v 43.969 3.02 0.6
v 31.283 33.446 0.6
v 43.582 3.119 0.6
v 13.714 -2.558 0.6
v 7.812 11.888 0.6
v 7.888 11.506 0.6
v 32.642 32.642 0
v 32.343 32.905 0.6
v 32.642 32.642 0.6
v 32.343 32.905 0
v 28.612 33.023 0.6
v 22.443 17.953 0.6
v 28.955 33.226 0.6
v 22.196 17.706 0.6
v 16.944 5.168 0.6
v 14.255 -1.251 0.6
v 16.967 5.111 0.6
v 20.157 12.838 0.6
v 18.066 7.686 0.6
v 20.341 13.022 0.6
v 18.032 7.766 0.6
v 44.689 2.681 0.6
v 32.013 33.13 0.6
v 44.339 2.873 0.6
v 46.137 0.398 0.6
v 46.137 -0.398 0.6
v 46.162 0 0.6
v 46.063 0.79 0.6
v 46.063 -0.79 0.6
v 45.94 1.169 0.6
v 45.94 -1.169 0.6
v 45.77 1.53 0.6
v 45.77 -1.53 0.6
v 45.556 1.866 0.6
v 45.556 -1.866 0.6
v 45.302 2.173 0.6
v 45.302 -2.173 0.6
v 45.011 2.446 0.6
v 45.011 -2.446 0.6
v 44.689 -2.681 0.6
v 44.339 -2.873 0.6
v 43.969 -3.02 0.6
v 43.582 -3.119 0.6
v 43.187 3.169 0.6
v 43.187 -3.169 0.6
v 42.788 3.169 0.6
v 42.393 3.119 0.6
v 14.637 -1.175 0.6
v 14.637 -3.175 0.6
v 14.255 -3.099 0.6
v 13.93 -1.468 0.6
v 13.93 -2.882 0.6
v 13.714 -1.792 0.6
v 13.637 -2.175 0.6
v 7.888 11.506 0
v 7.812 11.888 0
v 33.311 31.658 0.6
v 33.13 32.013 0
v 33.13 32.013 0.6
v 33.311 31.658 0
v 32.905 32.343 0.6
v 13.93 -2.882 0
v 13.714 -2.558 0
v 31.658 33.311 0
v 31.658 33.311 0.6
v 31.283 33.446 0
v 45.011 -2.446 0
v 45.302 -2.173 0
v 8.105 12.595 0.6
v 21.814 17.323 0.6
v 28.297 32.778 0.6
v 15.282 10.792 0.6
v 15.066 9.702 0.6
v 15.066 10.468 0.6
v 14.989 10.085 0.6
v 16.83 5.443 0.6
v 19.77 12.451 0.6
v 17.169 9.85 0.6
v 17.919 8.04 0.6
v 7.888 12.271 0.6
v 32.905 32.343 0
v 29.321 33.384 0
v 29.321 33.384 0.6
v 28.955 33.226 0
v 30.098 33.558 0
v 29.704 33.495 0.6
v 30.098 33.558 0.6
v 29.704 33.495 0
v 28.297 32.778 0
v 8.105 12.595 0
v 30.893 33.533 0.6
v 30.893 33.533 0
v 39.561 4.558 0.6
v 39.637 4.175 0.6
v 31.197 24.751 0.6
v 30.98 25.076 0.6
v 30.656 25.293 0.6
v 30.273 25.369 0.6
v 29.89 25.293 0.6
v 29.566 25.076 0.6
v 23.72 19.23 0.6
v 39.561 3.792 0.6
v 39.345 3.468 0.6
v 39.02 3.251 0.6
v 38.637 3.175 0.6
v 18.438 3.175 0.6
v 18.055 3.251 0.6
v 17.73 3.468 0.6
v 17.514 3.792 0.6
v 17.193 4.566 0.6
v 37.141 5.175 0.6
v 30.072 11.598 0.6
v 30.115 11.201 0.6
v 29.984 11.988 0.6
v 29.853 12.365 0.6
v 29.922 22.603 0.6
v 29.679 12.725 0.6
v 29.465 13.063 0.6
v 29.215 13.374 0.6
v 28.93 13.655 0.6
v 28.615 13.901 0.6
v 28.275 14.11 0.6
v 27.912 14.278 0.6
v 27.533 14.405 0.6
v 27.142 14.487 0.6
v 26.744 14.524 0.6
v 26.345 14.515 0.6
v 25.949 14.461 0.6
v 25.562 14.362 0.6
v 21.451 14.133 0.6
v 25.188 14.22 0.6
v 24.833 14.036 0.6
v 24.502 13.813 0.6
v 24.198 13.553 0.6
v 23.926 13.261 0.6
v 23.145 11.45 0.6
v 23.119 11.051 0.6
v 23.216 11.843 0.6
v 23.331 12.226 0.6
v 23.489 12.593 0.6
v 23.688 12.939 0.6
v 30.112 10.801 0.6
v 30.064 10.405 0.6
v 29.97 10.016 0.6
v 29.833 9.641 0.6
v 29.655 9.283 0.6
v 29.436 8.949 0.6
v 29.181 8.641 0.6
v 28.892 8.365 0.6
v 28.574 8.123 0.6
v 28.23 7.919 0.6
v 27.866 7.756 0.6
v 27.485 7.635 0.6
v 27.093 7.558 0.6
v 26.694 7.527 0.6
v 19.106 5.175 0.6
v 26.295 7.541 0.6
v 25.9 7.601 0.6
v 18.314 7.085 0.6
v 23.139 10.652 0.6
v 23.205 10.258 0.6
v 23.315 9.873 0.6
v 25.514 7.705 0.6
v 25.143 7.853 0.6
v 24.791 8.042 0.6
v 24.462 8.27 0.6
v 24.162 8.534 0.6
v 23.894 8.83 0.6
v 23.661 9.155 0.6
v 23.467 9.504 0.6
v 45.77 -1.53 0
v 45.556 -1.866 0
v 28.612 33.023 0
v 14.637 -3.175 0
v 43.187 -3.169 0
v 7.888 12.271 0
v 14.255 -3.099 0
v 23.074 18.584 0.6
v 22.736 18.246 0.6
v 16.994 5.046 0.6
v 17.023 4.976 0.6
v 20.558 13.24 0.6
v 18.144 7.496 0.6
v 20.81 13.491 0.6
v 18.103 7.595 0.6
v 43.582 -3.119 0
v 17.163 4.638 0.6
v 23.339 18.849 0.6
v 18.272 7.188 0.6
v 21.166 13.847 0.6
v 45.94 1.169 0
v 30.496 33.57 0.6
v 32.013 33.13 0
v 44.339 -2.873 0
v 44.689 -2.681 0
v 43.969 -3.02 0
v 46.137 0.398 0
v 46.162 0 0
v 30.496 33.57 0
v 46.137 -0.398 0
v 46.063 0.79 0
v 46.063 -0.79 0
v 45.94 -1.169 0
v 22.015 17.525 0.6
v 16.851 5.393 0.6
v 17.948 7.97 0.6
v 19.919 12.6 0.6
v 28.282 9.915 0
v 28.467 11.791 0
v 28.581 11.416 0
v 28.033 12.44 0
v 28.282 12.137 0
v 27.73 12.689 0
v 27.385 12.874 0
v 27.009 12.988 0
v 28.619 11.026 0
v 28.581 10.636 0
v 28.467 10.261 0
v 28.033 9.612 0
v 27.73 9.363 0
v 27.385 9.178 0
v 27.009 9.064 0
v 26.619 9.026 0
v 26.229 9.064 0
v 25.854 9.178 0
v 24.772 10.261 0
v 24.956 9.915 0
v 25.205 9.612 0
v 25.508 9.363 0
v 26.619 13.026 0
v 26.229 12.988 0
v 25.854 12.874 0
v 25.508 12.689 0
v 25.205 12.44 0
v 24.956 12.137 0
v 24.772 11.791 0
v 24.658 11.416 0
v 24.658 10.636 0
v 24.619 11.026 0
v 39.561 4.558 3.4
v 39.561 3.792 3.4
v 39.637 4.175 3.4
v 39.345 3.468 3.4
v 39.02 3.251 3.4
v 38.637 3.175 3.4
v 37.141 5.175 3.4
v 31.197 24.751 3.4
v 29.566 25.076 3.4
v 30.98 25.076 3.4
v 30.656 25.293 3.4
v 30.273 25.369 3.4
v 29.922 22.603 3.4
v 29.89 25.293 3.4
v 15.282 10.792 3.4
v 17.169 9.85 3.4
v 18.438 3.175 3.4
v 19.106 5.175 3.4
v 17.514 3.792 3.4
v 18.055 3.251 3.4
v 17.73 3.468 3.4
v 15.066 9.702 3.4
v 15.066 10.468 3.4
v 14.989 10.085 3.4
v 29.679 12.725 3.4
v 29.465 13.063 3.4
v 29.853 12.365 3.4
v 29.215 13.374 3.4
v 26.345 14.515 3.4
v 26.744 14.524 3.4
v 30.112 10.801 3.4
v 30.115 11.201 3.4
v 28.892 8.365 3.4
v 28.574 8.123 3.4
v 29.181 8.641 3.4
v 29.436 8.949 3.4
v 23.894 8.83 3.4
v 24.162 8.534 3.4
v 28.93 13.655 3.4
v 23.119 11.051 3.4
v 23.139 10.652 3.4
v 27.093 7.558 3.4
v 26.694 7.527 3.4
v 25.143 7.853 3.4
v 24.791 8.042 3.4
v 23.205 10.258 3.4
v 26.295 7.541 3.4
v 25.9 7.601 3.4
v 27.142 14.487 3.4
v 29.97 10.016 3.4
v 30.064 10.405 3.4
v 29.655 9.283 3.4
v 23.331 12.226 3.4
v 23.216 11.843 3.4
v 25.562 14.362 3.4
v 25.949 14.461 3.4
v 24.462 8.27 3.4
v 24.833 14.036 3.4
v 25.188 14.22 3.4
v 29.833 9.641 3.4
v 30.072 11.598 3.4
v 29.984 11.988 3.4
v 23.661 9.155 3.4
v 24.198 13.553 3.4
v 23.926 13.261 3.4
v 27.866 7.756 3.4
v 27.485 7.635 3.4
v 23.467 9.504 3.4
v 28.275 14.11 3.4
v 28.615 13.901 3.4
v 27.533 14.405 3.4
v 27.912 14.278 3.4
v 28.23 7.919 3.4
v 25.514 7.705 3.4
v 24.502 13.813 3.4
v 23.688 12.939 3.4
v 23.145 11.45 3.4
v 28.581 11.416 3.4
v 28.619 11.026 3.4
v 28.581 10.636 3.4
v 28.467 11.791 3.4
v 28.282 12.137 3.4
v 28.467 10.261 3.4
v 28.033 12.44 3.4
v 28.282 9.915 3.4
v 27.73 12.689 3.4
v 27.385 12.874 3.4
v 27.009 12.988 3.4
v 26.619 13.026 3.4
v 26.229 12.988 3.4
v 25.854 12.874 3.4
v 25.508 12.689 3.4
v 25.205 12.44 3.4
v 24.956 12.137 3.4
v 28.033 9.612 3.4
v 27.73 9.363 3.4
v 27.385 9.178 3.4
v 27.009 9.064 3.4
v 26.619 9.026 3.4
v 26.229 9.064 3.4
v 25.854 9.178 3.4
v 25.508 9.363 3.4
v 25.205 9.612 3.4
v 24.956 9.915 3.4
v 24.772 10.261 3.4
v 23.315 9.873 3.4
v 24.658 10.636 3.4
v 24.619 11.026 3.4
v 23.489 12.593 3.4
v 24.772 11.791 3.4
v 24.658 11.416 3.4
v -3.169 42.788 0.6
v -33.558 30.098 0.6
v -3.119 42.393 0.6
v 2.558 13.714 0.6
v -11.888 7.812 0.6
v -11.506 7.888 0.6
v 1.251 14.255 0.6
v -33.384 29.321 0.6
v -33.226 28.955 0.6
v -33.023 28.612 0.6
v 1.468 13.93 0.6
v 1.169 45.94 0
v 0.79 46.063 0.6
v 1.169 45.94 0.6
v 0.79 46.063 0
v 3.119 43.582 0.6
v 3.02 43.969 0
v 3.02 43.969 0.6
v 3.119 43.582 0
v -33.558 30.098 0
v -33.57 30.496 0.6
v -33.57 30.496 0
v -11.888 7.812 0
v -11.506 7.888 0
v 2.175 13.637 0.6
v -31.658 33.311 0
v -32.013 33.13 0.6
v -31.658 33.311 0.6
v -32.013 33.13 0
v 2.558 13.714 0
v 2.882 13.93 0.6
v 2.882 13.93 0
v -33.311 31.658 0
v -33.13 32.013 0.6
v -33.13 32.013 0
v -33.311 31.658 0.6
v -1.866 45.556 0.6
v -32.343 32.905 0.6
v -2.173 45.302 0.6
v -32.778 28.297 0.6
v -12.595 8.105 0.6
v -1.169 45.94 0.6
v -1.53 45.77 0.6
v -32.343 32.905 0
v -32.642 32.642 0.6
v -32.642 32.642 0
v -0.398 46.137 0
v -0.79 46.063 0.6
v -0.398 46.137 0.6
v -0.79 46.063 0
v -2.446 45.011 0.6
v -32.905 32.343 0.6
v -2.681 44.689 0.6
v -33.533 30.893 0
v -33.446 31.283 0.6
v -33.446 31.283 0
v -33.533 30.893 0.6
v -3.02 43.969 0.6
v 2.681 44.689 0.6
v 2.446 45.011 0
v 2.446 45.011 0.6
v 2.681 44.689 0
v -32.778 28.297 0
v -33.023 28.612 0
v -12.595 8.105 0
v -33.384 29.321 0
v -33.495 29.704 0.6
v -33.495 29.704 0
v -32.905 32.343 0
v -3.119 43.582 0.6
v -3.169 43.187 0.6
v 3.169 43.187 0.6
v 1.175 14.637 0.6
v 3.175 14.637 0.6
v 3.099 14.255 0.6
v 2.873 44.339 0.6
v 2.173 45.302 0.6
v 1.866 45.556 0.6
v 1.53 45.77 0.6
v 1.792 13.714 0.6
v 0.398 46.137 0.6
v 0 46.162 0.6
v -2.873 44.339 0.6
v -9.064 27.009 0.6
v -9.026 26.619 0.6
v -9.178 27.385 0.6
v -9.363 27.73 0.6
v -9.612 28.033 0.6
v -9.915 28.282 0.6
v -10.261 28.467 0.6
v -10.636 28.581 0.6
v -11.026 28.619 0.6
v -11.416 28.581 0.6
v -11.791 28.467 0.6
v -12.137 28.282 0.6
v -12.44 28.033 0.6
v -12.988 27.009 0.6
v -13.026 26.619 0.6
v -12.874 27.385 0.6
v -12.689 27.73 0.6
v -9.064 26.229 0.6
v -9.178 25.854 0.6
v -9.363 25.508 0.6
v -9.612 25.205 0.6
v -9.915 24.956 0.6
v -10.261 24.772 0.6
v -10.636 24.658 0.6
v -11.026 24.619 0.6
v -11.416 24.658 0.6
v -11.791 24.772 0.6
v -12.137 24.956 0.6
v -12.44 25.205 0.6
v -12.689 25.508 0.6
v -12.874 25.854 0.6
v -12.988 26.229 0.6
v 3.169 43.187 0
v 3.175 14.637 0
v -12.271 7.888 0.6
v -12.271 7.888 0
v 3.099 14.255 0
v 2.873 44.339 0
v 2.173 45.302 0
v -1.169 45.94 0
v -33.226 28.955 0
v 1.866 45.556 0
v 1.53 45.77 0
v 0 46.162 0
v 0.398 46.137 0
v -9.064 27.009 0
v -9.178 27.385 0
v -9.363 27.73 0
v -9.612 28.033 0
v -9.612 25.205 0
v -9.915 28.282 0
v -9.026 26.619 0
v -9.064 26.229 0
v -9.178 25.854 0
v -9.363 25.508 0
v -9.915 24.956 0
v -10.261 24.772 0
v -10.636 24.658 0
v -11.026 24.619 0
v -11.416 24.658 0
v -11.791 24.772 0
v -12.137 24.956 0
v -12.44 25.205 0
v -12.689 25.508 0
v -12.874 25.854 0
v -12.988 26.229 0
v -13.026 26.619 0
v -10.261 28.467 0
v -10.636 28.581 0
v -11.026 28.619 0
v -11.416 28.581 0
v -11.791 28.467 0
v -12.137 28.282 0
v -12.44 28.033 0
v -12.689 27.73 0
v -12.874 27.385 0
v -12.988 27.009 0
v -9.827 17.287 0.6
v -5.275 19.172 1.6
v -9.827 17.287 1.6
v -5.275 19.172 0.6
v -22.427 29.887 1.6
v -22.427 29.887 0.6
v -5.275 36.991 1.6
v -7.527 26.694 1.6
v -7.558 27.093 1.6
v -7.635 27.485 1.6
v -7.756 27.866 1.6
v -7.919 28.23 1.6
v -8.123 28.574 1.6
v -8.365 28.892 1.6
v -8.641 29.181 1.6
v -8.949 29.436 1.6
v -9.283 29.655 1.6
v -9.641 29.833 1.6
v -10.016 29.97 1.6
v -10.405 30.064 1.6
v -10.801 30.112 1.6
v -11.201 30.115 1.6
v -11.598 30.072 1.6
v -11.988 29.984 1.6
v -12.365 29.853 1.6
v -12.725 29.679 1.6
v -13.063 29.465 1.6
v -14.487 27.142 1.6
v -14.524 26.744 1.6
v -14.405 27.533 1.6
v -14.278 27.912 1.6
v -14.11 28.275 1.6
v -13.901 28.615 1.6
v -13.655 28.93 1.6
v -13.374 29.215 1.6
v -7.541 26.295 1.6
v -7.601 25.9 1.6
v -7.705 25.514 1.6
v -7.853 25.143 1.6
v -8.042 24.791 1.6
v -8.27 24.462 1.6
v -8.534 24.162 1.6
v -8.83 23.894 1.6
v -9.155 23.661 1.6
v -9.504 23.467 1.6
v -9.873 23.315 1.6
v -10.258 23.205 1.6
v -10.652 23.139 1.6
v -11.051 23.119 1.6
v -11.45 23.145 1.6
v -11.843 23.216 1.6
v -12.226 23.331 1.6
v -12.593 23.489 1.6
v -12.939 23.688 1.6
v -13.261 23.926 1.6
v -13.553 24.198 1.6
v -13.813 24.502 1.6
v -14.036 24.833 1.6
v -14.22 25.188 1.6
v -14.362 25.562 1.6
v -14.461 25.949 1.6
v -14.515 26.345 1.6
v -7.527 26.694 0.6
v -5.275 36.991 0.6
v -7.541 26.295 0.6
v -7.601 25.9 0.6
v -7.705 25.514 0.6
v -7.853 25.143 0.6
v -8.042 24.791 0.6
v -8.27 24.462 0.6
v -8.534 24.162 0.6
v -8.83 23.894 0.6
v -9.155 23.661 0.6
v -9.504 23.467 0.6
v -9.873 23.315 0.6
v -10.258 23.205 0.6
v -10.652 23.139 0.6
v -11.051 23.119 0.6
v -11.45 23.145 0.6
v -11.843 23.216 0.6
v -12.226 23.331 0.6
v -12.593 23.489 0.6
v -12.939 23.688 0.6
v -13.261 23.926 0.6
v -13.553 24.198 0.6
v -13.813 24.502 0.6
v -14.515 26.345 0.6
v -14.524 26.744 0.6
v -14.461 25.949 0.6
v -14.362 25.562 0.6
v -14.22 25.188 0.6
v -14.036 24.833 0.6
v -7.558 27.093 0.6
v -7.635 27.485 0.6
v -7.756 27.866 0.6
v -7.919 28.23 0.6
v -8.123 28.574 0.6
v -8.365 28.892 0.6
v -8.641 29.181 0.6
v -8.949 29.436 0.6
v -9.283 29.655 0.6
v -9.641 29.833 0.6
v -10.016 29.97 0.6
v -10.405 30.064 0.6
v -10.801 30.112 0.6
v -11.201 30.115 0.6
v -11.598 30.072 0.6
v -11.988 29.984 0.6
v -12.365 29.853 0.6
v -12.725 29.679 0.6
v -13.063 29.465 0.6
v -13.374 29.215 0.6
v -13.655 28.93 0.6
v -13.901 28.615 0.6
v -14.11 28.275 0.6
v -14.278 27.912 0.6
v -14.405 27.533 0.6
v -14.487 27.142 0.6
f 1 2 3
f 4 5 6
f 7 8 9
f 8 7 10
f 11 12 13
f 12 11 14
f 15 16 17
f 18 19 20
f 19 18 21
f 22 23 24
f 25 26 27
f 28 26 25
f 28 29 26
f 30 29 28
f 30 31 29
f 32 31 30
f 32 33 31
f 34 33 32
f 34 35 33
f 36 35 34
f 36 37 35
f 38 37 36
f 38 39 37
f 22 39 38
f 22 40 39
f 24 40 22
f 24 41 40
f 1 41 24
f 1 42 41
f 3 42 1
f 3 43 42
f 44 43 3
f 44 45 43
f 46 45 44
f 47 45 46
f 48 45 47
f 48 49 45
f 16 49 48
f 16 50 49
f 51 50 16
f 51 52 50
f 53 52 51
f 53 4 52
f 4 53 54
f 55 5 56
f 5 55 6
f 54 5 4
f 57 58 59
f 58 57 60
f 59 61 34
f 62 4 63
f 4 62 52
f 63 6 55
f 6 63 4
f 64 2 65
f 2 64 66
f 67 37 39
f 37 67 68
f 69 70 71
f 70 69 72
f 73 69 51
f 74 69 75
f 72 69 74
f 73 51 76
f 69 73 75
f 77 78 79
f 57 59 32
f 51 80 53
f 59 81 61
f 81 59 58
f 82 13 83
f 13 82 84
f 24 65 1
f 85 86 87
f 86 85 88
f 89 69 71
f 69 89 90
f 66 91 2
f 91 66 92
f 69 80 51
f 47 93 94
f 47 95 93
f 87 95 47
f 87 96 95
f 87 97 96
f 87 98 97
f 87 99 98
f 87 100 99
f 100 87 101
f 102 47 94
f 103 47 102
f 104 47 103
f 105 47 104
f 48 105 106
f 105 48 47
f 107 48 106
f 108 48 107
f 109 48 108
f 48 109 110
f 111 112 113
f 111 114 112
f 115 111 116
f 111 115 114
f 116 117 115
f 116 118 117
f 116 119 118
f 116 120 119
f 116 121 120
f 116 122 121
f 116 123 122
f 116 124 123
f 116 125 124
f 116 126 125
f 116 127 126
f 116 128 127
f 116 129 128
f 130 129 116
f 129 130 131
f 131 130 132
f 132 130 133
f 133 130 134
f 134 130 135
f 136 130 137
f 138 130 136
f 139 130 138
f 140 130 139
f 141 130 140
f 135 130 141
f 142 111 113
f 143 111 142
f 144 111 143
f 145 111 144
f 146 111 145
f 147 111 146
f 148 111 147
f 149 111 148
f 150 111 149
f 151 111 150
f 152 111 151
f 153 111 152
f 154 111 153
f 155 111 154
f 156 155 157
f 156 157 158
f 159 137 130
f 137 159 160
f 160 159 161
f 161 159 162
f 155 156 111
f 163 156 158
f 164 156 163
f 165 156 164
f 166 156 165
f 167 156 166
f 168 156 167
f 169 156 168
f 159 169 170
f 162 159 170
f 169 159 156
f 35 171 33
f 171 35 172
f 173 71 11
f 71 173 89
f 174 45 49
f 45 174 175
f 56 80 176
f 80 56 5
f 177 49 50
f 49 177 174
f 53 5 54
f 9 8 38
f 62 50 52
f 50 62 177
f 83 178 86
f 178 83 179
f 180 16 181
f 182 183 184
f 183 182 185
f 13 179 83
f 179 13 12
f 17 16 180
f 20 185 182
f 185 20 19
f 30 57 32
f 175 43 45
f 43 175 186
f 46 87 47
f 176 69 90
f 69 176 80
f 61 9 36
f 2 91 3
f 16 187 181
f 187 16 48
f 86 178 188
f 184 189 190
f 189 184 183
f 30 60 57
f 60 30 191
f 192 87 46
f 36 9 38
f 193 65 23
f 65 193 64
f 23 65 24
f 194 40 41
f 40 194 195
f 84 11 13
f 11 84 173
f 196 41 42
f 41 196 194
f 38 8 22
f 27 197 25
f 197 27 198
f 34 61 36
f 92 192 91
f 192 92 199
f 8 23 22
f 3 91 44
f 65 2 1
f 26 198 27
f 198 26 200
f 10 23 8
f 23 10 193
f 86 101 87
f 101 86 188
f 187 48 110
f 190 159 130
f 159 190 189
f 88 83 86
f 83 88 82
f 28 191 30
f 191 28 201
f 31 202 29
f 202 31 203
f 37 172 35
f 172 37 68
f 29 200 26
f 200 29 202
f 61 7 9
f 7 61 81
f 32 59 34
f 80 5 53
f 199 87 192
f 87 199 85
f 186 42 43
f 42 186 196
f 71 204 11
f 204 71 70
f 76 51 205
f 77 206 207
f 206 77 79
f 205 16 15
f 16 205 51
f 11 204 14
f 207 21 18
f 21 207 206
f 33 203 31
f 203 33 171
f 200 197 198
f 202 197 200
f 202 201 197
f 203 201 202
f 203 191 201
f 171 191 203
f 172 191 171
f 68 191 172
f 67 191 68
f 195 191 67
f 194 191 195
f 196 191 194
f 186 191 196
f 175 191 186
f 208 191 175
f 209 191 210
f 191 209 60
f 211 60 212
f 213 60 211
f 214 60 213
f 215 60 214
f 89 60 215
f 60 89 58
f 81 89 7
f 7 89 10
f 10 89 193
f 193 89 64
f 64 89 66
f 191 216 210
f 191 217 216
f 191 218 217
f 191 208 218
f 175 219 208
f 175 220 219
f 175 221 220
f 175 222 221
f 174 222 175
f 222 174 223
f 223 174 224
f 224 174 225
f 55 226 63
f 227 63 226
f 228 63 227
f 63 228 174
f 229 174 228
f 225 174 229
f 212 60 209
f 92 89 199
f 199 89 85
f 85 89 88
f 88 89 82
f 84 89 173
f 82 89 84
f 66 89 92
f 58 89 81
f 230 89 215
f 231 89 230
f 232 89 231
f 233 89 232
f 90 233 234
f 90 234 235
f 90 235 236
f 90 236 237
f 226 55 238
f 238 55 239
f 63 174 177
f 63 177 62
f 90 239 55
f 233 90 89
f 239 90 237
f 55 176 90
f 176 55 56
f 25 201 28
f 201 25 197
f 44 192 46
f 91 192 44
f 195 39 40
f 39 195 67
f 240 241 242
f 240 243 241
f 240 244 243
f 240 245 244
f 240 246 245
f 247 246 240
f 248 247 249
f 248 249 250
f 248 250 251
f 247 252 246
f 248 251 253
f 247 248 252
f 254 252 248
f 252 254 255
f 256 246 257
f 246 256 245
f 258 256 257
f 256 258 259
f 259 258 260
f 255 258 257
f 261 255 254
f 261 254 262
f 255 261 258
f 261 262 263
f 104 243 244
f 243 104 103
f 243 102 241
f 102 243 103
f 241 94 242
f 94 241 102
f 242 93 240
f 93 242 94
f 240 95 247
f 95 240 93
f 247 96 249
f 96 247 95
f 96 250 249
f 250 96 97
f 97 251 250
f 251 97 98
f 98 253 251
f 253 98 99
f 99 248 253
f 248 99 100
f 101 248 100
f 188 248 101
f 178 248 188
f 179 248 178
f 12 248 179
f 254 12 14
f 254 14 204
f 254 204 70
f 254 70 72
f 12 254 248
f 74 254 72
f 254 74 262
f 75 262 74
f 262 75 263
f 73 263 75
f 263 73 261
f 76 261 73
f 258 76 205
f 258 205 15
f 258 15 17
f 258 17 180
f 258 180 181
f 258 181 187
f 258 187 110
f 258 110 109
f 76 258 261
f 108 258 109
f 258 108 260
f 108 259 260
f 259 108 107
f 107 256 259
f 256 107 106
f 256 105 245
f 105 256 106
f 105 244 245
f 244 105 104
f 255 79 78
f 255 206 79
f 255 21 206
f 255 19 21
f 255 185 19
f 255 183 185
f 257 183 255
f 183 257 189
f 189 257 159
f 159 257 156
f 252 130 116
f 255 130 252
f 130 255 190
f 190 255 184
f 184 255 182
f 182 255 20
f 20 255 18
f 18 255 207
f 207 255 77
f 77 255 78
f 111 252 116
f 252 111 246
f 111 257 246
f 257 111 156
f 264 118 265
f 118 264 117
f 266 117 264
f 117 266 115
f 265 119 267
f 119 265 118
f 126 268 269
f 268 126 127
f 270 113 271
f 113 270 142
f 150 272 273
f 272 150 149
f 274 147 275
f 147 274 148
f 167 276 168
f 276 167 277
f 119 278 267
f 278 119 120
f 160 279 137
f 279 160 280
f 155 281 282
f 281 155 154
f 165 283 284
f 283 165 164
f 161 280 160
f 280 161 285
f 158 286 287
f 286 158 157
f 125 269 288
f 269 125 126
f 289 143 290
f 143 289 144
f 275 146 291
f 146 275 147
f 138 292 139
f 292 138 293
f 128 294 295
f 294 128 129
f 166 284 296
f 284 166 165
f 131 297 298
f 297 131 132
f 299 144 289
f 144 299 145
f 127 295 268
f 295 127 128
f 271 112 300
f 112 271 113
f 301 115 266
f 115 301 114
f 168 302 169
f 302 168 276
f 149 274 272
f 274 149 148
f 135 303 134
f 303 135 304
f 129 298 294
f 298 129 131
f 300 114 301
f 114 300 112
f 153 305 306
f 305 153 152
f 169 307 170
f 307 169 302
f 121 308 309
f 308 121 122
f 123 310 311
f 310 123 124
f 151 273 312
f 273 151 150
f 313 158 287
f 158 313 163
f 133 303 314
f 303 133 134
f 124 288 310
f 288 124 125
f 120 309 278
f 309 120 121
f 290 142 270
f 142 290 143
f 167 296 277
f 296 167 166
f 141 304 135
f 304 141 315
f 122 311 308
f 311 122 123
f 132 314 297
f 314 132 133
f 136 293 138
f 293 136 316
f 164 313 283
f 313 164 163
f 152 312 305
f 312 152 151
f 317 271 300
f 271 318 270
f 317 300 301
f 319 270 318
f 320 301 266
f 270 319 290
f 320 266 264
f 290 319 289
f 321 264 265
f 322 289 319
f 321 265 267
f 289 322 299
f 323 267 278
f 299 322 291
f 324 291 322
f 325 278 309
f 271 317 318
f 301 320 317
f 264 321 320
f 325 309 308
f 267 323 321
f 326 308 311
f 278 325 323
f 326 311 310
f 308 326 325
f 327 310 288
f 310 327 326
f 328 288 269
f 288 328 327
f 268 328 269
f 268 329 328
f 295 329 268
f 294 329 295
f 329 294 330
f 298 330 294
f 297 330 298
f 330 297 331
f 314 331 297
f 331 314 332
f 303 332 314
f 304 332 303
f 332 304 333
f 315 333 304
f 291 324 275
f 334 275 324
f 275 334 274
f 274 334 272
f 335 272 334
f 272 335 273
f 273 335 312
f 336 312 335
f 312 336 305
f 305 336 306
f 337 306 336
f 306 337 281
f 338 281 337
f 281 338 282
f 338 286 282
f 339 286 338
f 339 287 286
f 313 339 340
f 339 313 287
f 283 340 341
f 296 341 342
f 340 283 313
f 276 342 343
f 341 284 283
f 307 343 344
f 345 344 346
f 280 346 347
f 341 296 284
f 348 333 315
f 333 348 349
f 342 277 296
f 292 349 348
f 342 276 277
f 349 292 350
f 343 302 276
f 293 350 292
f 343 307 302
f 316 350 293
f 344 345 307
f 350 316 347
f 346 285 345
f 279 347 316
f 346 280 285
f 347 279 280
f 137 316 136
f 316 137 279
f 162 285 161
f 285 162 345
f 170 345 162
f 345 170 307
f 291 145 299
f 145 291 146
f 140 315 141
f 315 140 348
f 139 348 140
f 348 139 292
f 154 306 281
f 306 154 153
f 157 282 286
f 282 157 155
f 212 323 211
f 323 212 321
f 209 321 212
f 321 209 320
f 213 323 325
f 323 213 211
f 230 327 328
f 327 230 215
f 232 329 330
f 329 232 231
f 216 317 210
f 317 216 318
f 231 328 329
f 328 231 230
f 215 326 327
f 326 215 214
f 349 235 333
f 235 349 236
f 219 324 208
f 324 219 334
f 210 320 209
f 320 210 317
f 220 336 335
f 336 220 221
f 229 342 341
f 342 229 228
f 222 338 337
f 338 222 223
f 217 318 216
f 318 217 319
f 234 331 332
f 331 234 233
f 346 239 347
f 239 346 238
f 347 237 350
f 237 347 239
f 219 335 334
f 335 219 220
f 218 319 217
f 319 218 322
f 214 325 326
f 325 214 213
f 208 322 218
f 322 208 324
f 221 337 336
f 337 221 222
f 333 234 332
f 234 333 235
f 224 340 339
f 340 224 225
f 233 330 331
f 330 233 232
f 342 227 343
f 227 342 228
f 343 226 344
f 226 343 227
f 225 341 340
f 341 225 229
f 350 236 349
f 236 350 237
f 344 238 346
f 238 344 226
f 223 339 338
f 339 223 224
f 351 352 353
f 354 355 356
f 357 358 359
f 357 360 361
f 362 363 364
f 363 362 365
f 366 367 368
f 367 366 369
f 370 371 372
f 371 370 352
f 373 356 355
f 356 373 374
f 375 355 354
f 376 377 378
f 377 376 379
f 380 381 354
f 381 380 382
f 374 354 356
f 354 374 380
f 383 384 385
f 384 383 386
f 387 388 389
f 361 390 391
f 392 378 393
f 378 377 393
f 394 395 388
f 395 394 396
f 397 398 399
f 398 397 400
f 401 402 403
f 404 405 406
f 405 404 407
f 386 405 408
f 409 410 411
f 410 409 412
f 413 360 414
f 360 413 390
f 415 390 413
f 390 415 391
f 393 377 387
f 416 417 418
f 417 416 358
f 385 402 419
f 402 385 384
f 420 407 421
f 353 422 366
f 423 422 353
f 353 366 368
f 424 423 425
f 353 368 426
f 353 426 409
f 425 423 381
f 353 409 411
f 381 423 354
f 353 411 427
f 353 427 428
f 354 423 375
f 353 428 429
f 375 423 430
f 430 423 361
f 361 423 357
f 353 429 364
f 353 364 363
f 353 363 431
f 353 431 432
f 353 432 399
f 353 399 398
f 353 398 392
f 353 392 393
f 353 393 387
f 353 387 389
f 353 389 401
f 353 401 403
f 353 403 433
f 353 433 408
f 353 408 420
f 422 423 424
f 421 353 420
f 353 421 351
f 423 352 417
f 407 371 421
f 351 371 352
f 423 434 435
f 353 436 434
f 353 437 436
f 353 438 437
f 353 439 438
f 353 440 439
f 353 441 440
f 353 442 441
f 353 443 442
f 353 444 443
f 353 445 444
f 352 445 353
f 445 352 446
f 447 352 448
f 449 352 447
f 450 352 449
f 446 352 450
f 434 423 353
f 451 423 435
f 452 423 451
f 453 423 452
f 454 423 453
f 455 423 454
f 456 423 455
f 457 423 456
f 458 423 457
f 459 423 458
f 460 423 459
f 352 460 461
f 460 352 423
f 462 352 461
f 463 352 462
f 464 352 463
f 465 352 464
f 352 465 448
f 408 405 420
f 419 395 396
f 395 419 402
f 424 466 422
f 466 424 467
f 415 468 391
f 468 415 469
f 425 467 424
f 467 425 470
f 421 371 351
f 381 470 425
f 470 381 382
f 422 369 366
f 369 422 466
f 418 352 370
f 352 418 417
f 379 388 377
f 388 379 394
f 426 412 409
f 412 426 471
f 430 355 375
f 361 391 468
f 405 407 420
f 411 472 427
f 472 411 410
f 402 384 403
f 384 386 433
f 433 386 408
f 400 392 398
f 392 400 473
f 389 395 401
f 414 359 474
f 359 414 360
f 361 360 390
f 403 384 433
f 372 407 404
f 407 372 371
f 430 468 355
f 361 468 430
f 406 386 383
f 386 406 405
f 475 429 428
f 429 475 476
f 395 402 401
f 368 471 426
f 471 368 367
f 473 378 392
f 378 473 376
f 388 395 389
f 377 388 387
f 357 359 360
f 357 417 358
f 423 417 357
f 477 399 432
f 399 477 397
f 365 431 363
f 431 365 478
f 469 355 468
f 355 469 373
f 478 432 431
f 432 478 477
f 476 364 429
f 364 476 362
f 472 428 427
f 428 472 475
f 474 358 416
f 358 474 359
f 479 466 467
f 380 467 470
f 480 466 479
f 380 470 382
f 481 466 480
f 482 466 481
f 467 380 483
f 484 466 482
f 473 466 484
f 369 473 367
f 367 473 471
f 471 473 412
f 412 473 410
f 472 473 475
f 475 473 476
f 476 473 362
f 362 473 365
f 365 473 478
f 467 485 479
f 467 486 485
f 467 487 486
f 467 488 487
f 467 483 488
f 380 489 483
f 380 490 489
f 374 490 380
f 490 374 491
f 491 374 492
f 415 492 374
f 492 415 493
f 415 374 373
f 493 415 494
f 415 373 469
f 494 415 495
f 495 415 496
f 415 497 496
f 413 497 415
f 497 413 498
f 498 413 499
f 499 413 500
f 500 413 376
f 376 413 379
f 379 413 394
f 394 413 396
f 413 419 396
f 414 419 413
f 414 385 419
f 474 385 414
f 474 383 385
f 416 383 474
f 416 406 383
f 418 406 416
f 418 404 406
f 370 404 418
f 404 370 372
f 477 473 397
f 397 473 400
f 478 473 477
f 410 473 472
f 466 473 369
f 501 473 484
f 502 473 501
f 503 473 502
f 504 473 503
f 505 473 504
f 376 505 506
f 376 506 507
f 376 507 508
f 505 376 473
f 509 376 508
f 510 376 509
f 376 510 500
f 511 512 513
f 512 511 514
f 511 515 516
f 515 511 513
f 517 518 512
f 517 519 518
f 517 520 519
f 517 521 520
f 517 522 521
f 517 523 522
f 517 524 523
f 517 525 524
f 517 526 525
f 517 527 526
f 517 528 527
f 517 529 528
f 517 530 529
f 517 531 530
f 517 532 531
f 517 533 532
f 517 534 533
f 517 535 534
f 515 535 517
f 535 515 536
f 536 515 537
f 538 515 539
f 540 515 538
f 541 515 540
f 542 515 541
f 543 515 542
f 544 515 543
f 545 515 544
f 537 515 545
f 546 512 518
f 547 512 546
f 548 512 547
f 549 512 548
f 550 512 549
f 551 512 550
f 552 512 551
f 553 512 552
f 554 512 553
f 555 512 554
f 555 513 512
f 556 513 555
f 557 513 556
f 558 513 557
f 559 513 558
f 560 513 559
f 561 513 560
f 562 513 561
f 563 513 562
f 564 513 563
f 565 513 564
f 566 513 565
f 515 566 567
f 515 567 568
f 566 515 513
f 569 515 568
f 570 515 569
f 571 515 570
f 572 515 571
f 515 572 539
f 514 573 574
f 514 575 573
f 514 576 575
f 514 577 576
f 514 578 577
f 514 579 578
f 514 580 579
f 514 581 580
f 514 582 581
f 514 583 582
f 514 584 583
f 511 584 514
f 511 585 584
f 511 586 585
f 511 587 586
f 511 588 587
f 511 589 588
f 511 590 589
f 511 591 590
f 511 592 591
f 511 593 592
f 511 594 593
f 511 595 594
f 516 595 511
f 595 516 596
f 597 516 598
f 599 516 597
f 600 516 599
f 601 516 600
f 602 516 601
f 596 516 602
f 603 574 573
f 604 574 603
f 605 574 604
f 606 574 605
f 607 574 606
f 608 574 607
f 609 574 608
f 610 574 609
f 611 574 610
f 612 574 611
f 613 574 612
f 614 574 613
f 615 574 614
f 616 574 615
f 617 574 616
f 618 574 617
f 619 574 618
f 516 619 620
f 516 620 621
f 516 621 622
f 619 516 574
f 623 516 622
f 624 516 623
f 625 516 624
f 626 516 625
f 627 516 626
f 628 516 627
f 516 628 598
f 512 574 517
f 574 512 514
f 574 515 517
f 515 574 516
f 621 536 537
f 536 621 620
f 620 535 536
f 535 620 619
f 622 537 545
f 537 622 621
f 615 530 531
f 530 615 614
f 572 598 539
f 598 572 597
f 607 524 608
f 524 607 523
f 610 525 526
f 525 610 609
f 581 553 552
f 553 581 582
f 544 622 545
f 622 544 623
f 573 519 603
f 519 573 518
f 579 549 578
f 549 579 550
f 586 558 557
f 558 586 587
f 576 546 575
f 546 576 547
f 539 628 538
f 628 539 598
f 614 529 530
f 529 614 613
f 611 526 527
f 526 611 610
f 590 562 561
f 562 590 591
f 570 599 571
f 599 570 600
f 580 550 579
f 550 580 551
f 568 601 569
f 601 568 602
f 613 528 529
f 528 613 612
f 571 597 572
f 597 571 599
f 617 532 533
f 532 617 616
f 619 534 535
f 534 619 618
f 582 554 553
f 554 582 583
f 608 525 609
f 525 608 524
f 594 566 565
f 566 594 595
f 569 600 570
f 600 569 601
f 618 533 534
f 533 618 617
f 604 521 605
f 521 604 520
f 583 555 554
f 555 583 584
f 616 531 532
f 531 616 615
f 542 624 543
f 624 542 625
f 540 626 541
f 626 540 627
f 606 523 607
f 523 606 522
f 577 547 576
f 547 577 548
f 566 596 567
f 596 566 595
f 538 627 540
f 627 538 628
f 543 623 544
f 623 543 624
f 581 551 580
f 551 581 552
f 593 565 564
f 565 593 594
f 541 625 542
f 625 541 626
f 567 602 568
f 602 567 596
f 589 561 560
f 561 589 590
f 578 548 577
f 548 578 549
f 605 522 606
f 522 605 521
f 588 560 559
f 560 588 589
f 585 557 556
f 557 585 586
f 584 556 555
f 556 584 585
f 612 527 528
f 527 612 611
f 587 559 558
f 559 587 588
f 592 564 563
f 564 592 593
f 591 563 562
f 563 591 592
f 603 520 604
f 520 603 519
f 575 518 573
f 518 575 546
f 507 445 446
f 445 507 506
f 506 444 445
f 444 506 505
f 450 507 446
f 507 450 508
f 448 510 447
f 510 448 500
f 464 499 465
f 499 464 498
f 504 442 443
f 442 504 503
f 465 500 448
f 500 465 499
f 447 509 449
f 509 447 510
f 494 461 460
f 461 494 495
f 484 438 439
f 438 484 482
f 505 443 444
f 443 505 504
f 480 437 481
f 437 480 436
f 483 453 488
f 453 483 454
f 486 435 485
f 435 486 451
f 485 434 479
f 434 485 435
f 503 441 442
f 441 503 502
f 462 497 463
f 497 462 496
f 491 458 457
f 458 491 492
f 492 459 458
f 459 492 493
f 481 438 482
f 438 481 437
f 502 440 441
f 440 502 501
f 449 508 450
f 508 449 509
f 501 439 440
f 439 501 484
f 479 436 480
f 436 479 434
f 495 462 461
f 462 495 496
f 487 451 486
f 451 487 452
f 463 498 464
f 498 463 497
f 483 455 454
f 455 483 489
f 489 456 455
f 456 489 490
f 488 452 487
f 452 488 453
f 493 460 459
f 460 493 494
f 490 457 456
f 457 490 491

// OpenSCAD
include <MCAD/bearing.scad>

// ---------------------------
// Constants
// ---------------------------
$fa = 1;
$fs = 0.4;
in_to_mm = 25.4;
gap = 1.25; //1/32 * in_to_mm;
nut_gap = 7;//3/4 * in_to_mm;
eps = .2;

bearingModel = 688; //608
bearing_w = bearingWidth(bearingModel);
bearing_or = bearingOuterDiameter(bearingModel)/2;
bearing_ir = bearingInnerDiameter(bearingModel)/2;


// ---------------------------
// Variables
// ---------------------------
num_holes=8;
sectors = num_holes;
sector_degrees = 360 / sectors;

mag1_hole_d = (1/4 * in_to_mm);
mag1_hole_r = (mag1_hole_d/2);
mag1_w = 1/4 * in_to_mm;

mag2_hole_d = (1/8 * in_to_mm);
mag2_hole_r = (mag2_hole_d/2);
mag2_w = 1/4 * in_to_mm;

mag_space_1 = 3;
mag_space_2 = 2;

cir = num_holes*2*(mag1_hole_d-mag_space_2/2);
temp_r = cir/(3.14159*2);
min_r = bearing_or + mag1_hole_d + mag2_hole_d + mag_space_2+2;
central_r3 = max(temp_r, min_r);
central_r2 = central_r3 + mag2_hole_r + mag_space_2 + mag2_hole_r;
central_r = central_r2 + mag2_hole_r + mag_space_1 + mag1_hole_r;
disk_r = central_r+2;

coil_cap_w = .6;
coil_w = bearing_w-1;//5;//(1/8 * in_to_mm = 3.175);
coil_hole_r = mag1_hole_r*3;
coil_hole_d = coil_hole_r*2;
coil_holder_r = mag1_hole_r;
coil_holder_bolt_r = 2;
coil_holder_top_insert_h = 1;
coil_holder_inner_shell_t = 2;
coil_center_hole_r = bearing_or+.2; //7

coil_holder_hull_r = 1;
coil_holder_out_r1 = central_r3-mag1_hole_r-mag2_hole_r-mag_space_2;
coil_holder_out_x1 = coil_holder_out_r1-coil_holder_hull_r/num_holes;
coil_holder_out_y1 = mag1_hole_r-coil_holder_hull_r;
coil_holder_out_r2 = central_r+mag1_hole_d+mag_space_1;
coil_holder_out_x2 = coil_holder_out_r2+mag1_hole_r-coil_holder_hull_r*4;
coil_holder_out_y2 = mag1_hole_r-coil_holder_hull_r;

coil_holder_in_x1 = coil_holder_out_r1+mag1_hole_r+coil_holder_hull_r/2;
coil_holder_in_y1 = mag1_hole_r+coil_holder_hull_r;
coil_holder_in_x2 = coil_holder_out_r2-mag1_hole_r-coil_holder_hull_r*2;
coil_holder_in_y2 = mag1_hole_r+coil_holder_hull_r;
coil_holder_in_len = coil_holder_in_x2 - coil_holder_in_x1 + coil_holder_hull_r*2;
coil_holder_center_r = coil_holder_out_x1 + (coil_holder_out_x2 - coil_holder_out_x1)/2;
echo(str("coil_holder_in_len:", coil_holder_in_len));

base_d = 100;
base_r = base_d/2;  //central_r + coil_hole_d;
base_w = 3; //bearing_w/1.75
base_l = 70; //3.5 * in_to_mm; 66.4
base_lc = nut_gap + gap + mag2_w + gap + coil_w +gap + mag1_w + gap + coil_w + gap + mag1_w + gap + coil_w + gap + mag2_w + gap + nut_gap;
base_side_h = 15;
alignment_bolt_r = 3.9/2;

axel_h = gap+coil_w+gap;
axel_ir = bearing_ir+.1;
axel_or = coil_center_hole_r-1;

echo(str("sector_degrees:", sector_degrees));
echo(str("coil_w:", coil_w));
echo(str("bearing_w:", bearing_w));
echo(str("mag1_w:", mag1_w));
echo(str("mag1_hole_r:", mag1_hole_r));
echo(str("mag2_hole_r:", mag2_hole_r));
echo(str("coil_hole_r:", coil_hole_r));
echo(str("coil_holder_r:", coil_holder_r));
echo(str("axel_h:", axel_h));
echo(str("axel_ir:", axel_ir));
echo(str("base_lc:", base_lc));

//innerCoilHolderShell();
//coilHolderTopInsert();
coilHolderBottom();
rotate([0,0,sector_degrees*2])coilHolderTop();

//outerCoilHolder();

//rotate([0,0,(sector_degrees/2)])
//translate([coil_holder_center_r,0,0]) cylinder(h=coil_w,r=2);

module coilHolderBottom() {
    h=coil_w-coil_cap_w;
    difference() {
        union() {
            coilHolderCap();
            innerCoilHolderShell(h=h);
            coilHolderCenterCylinder(h=h);
        }
        coilHolderCenterBoltHole();
    }
}

module innerCoilHolderShell(h=coil_w) {
    linear_extrude(height=h, slices=10) {
        difference() {
            innerCoilHolder2d();
            offset(r=-coil_holder_inner_shell_t) {
                innerCoilHolder2d();
            }
        }
    }
}

module coilHolderTop() {
    difference() {
        union() {
            coilHolderCap();
            coilHolderTopInsert();
        }
        coilHolderCenterCylinder(z=coil_cap_w);
        coilHolderCenterBoltHole();
    }
}

module coilHolderTopInsert(h=coil_holder_top_insert_h, z=coil_cap_w) {
    translate([0,0,z]) {
        linear_extrude(height=h, slices=1) {
            offset(r=-(coil_holder_inner_shell_t+0.1)) {
                innerCoilHolder2d();
            }
        }
    }
}

module coilHolderCap(w=coil_cap_w) {
    translate([0,0,w/2])outerCoilHolder(w=w);
}

module coilHolderCenterCylinder(h=coil_w, r=coil_holder_bolt_r+1.5, z=0) {
    rotate([0,0,(sector_degrees/2)])
        translate([coil_holder_center_r,0,z]) 
            cylinder(h=h,r=r);
}

module coilHolderCenterBoltHole() {
    coilHolderCenterCylinder(h=coil_w*3,r=coil_holder_bolt_r,z=-coil_w);
}



//#innerCoilHolder();
//scale([.9,.9,1])innerCoilHolder();
//%outerCoilHolder();
//coilDisk2(diskNum=1, bearing=true);
//z_offset = (mag1_w + bearing_w)/2;
//inv_num_holes = 1/num_holes;
//tmp_t = inv_num_holes*2; //0=blue, 1=white, 2=yellow, 3=green
//rotate([0,0,(-sector_degrees/(num_holes/2))*$t*num_holes]) {
////rotate([0,0,(-sector_degrees/(num_holes/2))*tmp_t*num_holes]) {
//    translate([0,0,z_offset])
//    %mag1Disk();
////    translate([0,0,-z_offset])
////    %mag1Disk();
//}


//tr1=1;//3/num_holes;//0.0;//0.125;
//color( "yellow", 1.0 ) {
//    rotate([0,0,(-sector_degrees/2)*tr1]) {
//        coilHoldersVisual();
//    }
//}
//tr2=0.5;
//color( "white", 1.0 ) {
//    rotate([0,0,(-sector_degrees/2)*tr2]) {
//        coilHoldersVisual();
//    }
//}
//tr3=1.5;
//color( "green", 1.0 ) {
//    rotate([0,0,(-sector_degrees/2)*tr3]) {
//        coilHoldersVisual();        
//    }
//}
//tr4=2;
//color( "blue", 1.0 ) {
//    rotate([0,0,(-sector_degrees/2)*tr4]) {    
//        coilHoldersVisual();    
//    }
//}




render_mode = "JOE"; //"FULL", "PRINT", "TEST";
print_mode = "COIL"; //"MAG1","MAG2","COIL","BASE", "BOTTOM", "END","AXEL","HOLDERS";

// Main rendering code
if (render_mode=="FULL") {
    renderFull();
} else if (render_mode=="PRINT") {
    renderPrint();
} else if (render_mode=="TEST") {
    renderTest();
}

module renderFull() {
    x_offset_1 = coil_w/2 + gap + mag1_w/2;
    x_offset_2 = x_offset_1 + mag1_w/2 + gap + coil_w/2;
    x_offset_3 = x_offset_2 + coil_w/2 + gap + mag2_w/2;
    z_offset = base_r+base_w/2;
    translate([0,0,0]) {
        // Base
        translate([0,0,0])
            generatorBase();
        
        // Rotating Magnet2 Disk 1
        translate([-x_offset_3,0,z_offset])
            rotate([0,90,0])mag2Disk();
        // Axel
        translate([-x_offset_2,0,z_offset])
            rotate([0,90,0])axel();
        // Coil Disk 1
        translate([-x_offset_2,0,z_offset])rotate([0,90,0])
            coilDisk();
        
        // Rotating Magnet1 Disk 1
        translate([-x_offset_1,0,z_offset])
            rotate([0,90,0])mag1Disk();
        // Axel
        translate([0,0,z_offset])
            rotate([0,90,0])axel();
        // Coil Disk 2
        translate([0,0,z_offset])rotate([0,90,0])
            coilDisk();
        // Rotating Magnet1 Disk 2
        translate([x_offset_1,0,z_offset])
            rotate([0,90,0])mag1Disk();
        
        // Rotating Magnet2 Disk 2
        translate([x_offset_3,0,z_offset])
            rotate([0,90,0])mag2Disk();
        // Axel
        translate([x_offset_2,0,z_offset])
            rotate([0,90,0])axel();
        // Coil Disk 3
        translate([x_offset_2,0,z_offset])rotate([0,90,0])
            coilDisk();
        
    }
}

module renderPrint() {
    if (print_mode=="MAG1") {
        // Magnet Disk1
        mag1Disk();
    } else if (print_mode=="MAG2") {
        // Magnet Disk2
        mag2Disk();
    } else if (print_mode=="COIL") {
        // COIL Disk
        coilDisk();
    } else if (print_mode=="BASE") {
        // Base
        generatorBase();
    } else if (print_mode=="BOTTOM") {
        // Base Bottom
        baseBottom();
    } else if (print_mode=="END") {
        // Base End Cap
        baseEndCap2();
    } else if (print_mode=="AXEL") {
        // Axel
        axel();
    } else if (print_mode=="HOLDERS") {
        // Wire coil holders
        for(x = [-1.5 : 1.5]) {
            translate([x*coil_hole_r*2.1,0,0])coilHolder();
        }
    }
}


// Stationary Disk with trapezoid coils
module coilDisk2(w=coil_w, diskNum=1, wires=true, bearing=false) {
    x = base_d-1.5;
    y = x;
    small_hole_r = 1;
    small_hole_or = central_r+mag1_hole_d+coil_hole_r;
    // Disk
    difference() {
        //main structure
        cube([x, y, w], center=true);
        //remove trapezoids for coils
        rotate([0,0,(-sector_degrees/2)*diskNum]) {
            coilHoldersOutline(w=coil_w+2);
        }
        // remove center hole for bearing
        cylinder(h=w*2,r=coil_center_hole_r,center=true);
        // remove holes for wires
        if (wires == true) {
            //wireChannelsStraight();
            structureHoles(w=w,radius=small_hole_or, hole_r=small_hole_r);
        }
        alignmentBoltHoles(w=w);
    }
    if (bearing == true) {
        translate([0, 0, -bearing_w/2])
        bearing(model=bearingModel, outline=false);
    }
}

//alignment_bolt_r
module alignmentBoltHoles(w=coil_w, r=alignment_bolt_r, i=10) {
    translate([base_r-i,base_r-i,0])cylinder(h=w*2,r=r,center=true);
    translate([-base_r+i,base_r-i,0])cylinder(h=w*2,r=r,center=true);
    translate([base_r-i,-base_r+i,0])cylinder(h=w*2,r=r,center=true);
    translate([-base_r+i,-base_r+i,0])cylinder(h=w*2,r=r,center=true);
}

module wireChannelsStraight() {
    radius = central_r+mag1_hole_d;
    sectors = num_holes/2;
    degrees = 360 / sectors;
    cyl_h = radius*(12/num_holes)-2;
    
    for(sector = [1 : sectors]) {
        angle = degrees * sector;
        x_pos = radius * sin(angle);
        y_pos = radius * cos(angle);
        x_off = (coil_hole_r) * cos(angle);
        y_off = (coil_hole_r) * sin(angle);
        cross_angle_1 = degrees/2-(angle+90);
        cross_angle_2 = degrees/2-(angle+degrees-90);
        rotate([0,0,degrees/2]) {
            translate([x_pos+y_off,y_pos+x_off,coil_w/2]){
                rotate([90,0,cross_angle_1])cylinder(h=cyl_h,r=coil_w/4,center=false);
            }
        }
        rotate([0,0,degrees/2]) {
            translate([x_pos+y_off,y_pos+x_off,coil_w/2]){
                rotate([90,0,cross_angle_2])cylinder(h=cyl_h,r=coil_w/4,center=false);
            }
        }
    }    
}

// Rotating Disk with magnets #1
module mag1Disk(w=mag1_w) {
    border = mag1_hole_r*1.5;
    mag1_disk_r = central_r + border;
    
    // Disk
    difference() {
        cylinder(h=w,r=mag1_disk_r,center=true);
        //remove holes for outer magnets
        holes(w*2, mag1_hole_r+eps);
        //remove holes for center magnets
        holes(w*2, mag2_hole_r+eps, radius=central_r2);
        //remove holes for inner magnets
        holes(w*2, mag2_hole_r+eps, radius=central_r3);
        //remove hole for main axel
        cylinder(h=w*2,r=axel_ir,center=true);
    }
}

// Coil Holders Visual
module coilHoldersVisual(w=coil_w) {
    for(sector = [0 : 2 : sectors]) {
        rotate([0,0,sector_degrees*sector]) { 
            outerCoilHolder(w=w);
            #innerCoilHolder(w=w+2);
        }
    }    
}

module coilHoldersOutline(w=coil_w) {
    for(sector = [0 : 2 : sectors]) {
        rotate([0,0,sector_degrees*sector]) { 
            outerCoilHolder(w=w);
        }
    }    
}

// Outer coil holder
module outerCoilHolder(w=coil_w) {
    hull() {
        translate([coil_holder_out_x1, -coil_holder_out_y1, 0])
        cylinder(h=w,r=coil_holder_hull_r,center=true);
        translate([coil_holder_out_x2, 0, 0])
        cylinder(h=w,r=mag1_hole_r,center=true);

        rotate([0,0,sector_degrees]) {
        translate([coil_holder_out_x1, coil_holder_out_y1, 0])
        cylinder(h=w,r=coil_holder_hull_r,center=true);
        translate([coil_holder_out_x2, 0, 0])
        cylinder(h=w,r=mag1_hole_r,center=true);
        }
    }
}


// Inner coil holder
module innerCoilHolder(w=coil_w) {
    hull() {
        translate([coil_holder_in_x1, coil_holder_in_y1, 0])
        cylinder(h=w,r=coil_holder_hull_r,center=true);
        translate([coil_holder_in_x2, coil_holder_in_y2, 0])
        cylinder(h=w,r=coil_holder_hull_r,center=true);

        rotate([0,0,sector_degrees]) {
        translate([coil_holder_in_x1, -coil_holder_in_y1, 0])
        cylinder(h=w,r=coil_holder_hull_r,center=true);
        translate([coil_holder_in_x2, -coil_holder_in_y2, 0])
        cylinder(h=w,r=coil_holder_hull_r,center=true);
        }
    }
}

// Inner coil holder
module innerCoilHolder2d() {
    hull() {
        translate([coil_holder_in_x1, coil_holder_in_y1, 0])
        circle(r=coil_holder_hull_r);
        translate([coil_holder_in_x2, coil_holder_in_y2, 0])
        circle(r=coil_holder_hull_r);

        rotate([0,0,sector_degrees]) {
        translate([coil_holder_in_x1, -coil_holder_in_y1, 0])
        circle(r=coil_holder_hull_r);
        translate([coil_holder_in_x2, -coil_holder_in_y2, 0])
        circle(r=coil_holder_hull_r);
        }
    }
}


module coilHolders(radius=central_r) {
    sectors = num_holes/2;
    sector_degrees = 360 / sectors;
    for(sector = [1 : sectors]) {
        angle = sector_degrees * sector;
        x_pos = radius * sin(angle);
        y_pos = radius * cos(angle);
        translate([x_pos,y_pos,0]){
            #coilHolder(top=false);
        }
    }    
}

module coilHolderHoles(radius=central_r) {
    sectors = num_holes/2;
    sector_degrees = 360 / sectors;
    for(sector = [1 : sectors]) {
        angle = sector_degrees * sector;
        x_pos = radius * sin(angle);
        y_pos = radius * cos(angle);
        translate([x_pos,y_pos,0]){
            coilHolderHole();
        }
    }    
}

module coilHolderHole() {
    cylinder(h=coil_w+2,r=coil_hole_r+.1,center=true);
}

// Coil Holder
module coilHolder(h1=.65, h2=coil_w, r1=coil_hole_r, r2=coil_holder_r, top=true) {
    r1e = r1-.2;
    r2e = r2+1;
    if (top == true) {
        translate([0,-r1-1,0])
            coilHolderBot(h1,h2,r1e,r2e);
        translate([0,r1+1,0])rotate([180,0,0])
            coilHolderTop(h1,r1e);
    } else {
        coilHolderBot(h1,h2,r1e,r2e);
    }
}

module coilHolderBot(h1,h2,r1,r2) {
    wire_holder_r = 1;
    difference() {
        union() {
            //Base
            cylinder(h=h1,r=r1,center=false);
            //Post
            cylinder(h=h2-h1,r=r2,center=false);
        }
        //remove bolt hole
        translate([0,0,-h2/2])cylinder(h=h2*2,r=coil_holder_bolt_r,center=false);
        //remove wire holder hole
        translate([0,r1-wire_holder_r/2,0])rotate([0,0,0])
            cylinder(h=h1*4,r=wire_holder_r,center=true);
    }
}

//module coilHolderTop(h1,r1) {
//    rotate([180,0,0]) {
//        difference() {
//            //Base
//            cylinder(h=h1,r=r1,center=false);
//            //remove hole for bolt
//            cylinder(h=h1*3,r=coil_holder_bolt_r,center=true);
//        }
//    }
//}

module axel() {
    hollowCyl(h=axel_h,or=axel_or,ir=axel_ir);
}

module hollowCyl(h,or,ir) {
    difference() {
        cylinder(h=h,r=or,center=true);
        cylinder(h=h*2,r=ir,center=true);
    }
}

module holes(w, hole_r, radius=central_r) {
    //radius = central_r;
    sectors = num_holes;
    sector_degrees = 360 / sectors;

    for(sector = [1 : sectors]) {
        angle = sector_degrees * sector;
        x_pos = radius * sin(angle);
        y_pos = radius * cos(angle);
        translate([x_pos,y_pos,0]){
            hole(w, hole_r);
        }
    }    
}

module structureHoles(w, radius, hole_r, sectors=num_holes) {
    sector_degrees = 360 / sectors;
    for(sector = [1 : 2 : sectors]) {
        angle = sector_degrees * sector;
        x_pos = radius * sin(angle);
        y_pos = radius * cos(angle);
        translate([x_pos,y_pos,0]){
            hole(w, hole_r);
        }
    }    
}

module hole(w, hole_r) {
    cylinder(h=w+2,r=hole_r,center=true);
}

module trapCoilHolderBase() {
    cylinder(coil_w,r=central_r,center=true);
}

module hexSupports(w=coil_w, supp_w, supp_l=24, radius=disk_r) {
    // Create supports for bearing holder
    sectors = num_holes;
    sector_degrees = 360 / sectors;

    for(sector = [1 : sectors]) {
        angle = sector_degrees * sector;
        x_pos = radius * sin(angle);
        y_pos = radius * cos(angle);
        translate([x_pos,y_pos,0]){
            rotate([0,0,-angle])cube([supp_w,supp_l,w], center=true);
        }
    }    
}

module hexSupports2(w=coil_w, supp_w, supp_l=24, radius=disk_r) {
    // Create supports for bearing holder
    sectors = num_holes;
    sector_degrees = 360 / sectors;

    for(sector = [1 : 2]) {
        angle = sector_degrees * sector;
        x_pos = radius * sin(angle);
        y_pos = radius * cos(angle);
        translate([x_pos,y_pos,0]){
            rotate([0,0,-angle])cube([supp_w,supp_l,w], center=true);
        }
    }    
}

module renderTest() {
    translate([0,0,1]) {
        difference() {
            translate([6,0,0])cube([42,30,2], center=true);
            
            //Big Magnet hole
            translate([-10,-10,0])hole(mag1_w, mag1_hole_r+eps); 

            //Coil hole
            translate([0,0,0])coilHolderHole();
            
            //Small Magnet hole
            translate([10,10,0])hole(mag2_w, mag2_hole_r+eps); 
            
            //Alignment bolt hole
            translate([-10,10,0])hole(base_w, alignment_bolt_r);
            
            //Coil Center Hole
            translate([18,0,0])hole(coil_w, coil_center_hole_r);
        }
    }
    translate([38,0,0])coilHolder();
    translate([-23,0,axel_h/2])axel();
}
